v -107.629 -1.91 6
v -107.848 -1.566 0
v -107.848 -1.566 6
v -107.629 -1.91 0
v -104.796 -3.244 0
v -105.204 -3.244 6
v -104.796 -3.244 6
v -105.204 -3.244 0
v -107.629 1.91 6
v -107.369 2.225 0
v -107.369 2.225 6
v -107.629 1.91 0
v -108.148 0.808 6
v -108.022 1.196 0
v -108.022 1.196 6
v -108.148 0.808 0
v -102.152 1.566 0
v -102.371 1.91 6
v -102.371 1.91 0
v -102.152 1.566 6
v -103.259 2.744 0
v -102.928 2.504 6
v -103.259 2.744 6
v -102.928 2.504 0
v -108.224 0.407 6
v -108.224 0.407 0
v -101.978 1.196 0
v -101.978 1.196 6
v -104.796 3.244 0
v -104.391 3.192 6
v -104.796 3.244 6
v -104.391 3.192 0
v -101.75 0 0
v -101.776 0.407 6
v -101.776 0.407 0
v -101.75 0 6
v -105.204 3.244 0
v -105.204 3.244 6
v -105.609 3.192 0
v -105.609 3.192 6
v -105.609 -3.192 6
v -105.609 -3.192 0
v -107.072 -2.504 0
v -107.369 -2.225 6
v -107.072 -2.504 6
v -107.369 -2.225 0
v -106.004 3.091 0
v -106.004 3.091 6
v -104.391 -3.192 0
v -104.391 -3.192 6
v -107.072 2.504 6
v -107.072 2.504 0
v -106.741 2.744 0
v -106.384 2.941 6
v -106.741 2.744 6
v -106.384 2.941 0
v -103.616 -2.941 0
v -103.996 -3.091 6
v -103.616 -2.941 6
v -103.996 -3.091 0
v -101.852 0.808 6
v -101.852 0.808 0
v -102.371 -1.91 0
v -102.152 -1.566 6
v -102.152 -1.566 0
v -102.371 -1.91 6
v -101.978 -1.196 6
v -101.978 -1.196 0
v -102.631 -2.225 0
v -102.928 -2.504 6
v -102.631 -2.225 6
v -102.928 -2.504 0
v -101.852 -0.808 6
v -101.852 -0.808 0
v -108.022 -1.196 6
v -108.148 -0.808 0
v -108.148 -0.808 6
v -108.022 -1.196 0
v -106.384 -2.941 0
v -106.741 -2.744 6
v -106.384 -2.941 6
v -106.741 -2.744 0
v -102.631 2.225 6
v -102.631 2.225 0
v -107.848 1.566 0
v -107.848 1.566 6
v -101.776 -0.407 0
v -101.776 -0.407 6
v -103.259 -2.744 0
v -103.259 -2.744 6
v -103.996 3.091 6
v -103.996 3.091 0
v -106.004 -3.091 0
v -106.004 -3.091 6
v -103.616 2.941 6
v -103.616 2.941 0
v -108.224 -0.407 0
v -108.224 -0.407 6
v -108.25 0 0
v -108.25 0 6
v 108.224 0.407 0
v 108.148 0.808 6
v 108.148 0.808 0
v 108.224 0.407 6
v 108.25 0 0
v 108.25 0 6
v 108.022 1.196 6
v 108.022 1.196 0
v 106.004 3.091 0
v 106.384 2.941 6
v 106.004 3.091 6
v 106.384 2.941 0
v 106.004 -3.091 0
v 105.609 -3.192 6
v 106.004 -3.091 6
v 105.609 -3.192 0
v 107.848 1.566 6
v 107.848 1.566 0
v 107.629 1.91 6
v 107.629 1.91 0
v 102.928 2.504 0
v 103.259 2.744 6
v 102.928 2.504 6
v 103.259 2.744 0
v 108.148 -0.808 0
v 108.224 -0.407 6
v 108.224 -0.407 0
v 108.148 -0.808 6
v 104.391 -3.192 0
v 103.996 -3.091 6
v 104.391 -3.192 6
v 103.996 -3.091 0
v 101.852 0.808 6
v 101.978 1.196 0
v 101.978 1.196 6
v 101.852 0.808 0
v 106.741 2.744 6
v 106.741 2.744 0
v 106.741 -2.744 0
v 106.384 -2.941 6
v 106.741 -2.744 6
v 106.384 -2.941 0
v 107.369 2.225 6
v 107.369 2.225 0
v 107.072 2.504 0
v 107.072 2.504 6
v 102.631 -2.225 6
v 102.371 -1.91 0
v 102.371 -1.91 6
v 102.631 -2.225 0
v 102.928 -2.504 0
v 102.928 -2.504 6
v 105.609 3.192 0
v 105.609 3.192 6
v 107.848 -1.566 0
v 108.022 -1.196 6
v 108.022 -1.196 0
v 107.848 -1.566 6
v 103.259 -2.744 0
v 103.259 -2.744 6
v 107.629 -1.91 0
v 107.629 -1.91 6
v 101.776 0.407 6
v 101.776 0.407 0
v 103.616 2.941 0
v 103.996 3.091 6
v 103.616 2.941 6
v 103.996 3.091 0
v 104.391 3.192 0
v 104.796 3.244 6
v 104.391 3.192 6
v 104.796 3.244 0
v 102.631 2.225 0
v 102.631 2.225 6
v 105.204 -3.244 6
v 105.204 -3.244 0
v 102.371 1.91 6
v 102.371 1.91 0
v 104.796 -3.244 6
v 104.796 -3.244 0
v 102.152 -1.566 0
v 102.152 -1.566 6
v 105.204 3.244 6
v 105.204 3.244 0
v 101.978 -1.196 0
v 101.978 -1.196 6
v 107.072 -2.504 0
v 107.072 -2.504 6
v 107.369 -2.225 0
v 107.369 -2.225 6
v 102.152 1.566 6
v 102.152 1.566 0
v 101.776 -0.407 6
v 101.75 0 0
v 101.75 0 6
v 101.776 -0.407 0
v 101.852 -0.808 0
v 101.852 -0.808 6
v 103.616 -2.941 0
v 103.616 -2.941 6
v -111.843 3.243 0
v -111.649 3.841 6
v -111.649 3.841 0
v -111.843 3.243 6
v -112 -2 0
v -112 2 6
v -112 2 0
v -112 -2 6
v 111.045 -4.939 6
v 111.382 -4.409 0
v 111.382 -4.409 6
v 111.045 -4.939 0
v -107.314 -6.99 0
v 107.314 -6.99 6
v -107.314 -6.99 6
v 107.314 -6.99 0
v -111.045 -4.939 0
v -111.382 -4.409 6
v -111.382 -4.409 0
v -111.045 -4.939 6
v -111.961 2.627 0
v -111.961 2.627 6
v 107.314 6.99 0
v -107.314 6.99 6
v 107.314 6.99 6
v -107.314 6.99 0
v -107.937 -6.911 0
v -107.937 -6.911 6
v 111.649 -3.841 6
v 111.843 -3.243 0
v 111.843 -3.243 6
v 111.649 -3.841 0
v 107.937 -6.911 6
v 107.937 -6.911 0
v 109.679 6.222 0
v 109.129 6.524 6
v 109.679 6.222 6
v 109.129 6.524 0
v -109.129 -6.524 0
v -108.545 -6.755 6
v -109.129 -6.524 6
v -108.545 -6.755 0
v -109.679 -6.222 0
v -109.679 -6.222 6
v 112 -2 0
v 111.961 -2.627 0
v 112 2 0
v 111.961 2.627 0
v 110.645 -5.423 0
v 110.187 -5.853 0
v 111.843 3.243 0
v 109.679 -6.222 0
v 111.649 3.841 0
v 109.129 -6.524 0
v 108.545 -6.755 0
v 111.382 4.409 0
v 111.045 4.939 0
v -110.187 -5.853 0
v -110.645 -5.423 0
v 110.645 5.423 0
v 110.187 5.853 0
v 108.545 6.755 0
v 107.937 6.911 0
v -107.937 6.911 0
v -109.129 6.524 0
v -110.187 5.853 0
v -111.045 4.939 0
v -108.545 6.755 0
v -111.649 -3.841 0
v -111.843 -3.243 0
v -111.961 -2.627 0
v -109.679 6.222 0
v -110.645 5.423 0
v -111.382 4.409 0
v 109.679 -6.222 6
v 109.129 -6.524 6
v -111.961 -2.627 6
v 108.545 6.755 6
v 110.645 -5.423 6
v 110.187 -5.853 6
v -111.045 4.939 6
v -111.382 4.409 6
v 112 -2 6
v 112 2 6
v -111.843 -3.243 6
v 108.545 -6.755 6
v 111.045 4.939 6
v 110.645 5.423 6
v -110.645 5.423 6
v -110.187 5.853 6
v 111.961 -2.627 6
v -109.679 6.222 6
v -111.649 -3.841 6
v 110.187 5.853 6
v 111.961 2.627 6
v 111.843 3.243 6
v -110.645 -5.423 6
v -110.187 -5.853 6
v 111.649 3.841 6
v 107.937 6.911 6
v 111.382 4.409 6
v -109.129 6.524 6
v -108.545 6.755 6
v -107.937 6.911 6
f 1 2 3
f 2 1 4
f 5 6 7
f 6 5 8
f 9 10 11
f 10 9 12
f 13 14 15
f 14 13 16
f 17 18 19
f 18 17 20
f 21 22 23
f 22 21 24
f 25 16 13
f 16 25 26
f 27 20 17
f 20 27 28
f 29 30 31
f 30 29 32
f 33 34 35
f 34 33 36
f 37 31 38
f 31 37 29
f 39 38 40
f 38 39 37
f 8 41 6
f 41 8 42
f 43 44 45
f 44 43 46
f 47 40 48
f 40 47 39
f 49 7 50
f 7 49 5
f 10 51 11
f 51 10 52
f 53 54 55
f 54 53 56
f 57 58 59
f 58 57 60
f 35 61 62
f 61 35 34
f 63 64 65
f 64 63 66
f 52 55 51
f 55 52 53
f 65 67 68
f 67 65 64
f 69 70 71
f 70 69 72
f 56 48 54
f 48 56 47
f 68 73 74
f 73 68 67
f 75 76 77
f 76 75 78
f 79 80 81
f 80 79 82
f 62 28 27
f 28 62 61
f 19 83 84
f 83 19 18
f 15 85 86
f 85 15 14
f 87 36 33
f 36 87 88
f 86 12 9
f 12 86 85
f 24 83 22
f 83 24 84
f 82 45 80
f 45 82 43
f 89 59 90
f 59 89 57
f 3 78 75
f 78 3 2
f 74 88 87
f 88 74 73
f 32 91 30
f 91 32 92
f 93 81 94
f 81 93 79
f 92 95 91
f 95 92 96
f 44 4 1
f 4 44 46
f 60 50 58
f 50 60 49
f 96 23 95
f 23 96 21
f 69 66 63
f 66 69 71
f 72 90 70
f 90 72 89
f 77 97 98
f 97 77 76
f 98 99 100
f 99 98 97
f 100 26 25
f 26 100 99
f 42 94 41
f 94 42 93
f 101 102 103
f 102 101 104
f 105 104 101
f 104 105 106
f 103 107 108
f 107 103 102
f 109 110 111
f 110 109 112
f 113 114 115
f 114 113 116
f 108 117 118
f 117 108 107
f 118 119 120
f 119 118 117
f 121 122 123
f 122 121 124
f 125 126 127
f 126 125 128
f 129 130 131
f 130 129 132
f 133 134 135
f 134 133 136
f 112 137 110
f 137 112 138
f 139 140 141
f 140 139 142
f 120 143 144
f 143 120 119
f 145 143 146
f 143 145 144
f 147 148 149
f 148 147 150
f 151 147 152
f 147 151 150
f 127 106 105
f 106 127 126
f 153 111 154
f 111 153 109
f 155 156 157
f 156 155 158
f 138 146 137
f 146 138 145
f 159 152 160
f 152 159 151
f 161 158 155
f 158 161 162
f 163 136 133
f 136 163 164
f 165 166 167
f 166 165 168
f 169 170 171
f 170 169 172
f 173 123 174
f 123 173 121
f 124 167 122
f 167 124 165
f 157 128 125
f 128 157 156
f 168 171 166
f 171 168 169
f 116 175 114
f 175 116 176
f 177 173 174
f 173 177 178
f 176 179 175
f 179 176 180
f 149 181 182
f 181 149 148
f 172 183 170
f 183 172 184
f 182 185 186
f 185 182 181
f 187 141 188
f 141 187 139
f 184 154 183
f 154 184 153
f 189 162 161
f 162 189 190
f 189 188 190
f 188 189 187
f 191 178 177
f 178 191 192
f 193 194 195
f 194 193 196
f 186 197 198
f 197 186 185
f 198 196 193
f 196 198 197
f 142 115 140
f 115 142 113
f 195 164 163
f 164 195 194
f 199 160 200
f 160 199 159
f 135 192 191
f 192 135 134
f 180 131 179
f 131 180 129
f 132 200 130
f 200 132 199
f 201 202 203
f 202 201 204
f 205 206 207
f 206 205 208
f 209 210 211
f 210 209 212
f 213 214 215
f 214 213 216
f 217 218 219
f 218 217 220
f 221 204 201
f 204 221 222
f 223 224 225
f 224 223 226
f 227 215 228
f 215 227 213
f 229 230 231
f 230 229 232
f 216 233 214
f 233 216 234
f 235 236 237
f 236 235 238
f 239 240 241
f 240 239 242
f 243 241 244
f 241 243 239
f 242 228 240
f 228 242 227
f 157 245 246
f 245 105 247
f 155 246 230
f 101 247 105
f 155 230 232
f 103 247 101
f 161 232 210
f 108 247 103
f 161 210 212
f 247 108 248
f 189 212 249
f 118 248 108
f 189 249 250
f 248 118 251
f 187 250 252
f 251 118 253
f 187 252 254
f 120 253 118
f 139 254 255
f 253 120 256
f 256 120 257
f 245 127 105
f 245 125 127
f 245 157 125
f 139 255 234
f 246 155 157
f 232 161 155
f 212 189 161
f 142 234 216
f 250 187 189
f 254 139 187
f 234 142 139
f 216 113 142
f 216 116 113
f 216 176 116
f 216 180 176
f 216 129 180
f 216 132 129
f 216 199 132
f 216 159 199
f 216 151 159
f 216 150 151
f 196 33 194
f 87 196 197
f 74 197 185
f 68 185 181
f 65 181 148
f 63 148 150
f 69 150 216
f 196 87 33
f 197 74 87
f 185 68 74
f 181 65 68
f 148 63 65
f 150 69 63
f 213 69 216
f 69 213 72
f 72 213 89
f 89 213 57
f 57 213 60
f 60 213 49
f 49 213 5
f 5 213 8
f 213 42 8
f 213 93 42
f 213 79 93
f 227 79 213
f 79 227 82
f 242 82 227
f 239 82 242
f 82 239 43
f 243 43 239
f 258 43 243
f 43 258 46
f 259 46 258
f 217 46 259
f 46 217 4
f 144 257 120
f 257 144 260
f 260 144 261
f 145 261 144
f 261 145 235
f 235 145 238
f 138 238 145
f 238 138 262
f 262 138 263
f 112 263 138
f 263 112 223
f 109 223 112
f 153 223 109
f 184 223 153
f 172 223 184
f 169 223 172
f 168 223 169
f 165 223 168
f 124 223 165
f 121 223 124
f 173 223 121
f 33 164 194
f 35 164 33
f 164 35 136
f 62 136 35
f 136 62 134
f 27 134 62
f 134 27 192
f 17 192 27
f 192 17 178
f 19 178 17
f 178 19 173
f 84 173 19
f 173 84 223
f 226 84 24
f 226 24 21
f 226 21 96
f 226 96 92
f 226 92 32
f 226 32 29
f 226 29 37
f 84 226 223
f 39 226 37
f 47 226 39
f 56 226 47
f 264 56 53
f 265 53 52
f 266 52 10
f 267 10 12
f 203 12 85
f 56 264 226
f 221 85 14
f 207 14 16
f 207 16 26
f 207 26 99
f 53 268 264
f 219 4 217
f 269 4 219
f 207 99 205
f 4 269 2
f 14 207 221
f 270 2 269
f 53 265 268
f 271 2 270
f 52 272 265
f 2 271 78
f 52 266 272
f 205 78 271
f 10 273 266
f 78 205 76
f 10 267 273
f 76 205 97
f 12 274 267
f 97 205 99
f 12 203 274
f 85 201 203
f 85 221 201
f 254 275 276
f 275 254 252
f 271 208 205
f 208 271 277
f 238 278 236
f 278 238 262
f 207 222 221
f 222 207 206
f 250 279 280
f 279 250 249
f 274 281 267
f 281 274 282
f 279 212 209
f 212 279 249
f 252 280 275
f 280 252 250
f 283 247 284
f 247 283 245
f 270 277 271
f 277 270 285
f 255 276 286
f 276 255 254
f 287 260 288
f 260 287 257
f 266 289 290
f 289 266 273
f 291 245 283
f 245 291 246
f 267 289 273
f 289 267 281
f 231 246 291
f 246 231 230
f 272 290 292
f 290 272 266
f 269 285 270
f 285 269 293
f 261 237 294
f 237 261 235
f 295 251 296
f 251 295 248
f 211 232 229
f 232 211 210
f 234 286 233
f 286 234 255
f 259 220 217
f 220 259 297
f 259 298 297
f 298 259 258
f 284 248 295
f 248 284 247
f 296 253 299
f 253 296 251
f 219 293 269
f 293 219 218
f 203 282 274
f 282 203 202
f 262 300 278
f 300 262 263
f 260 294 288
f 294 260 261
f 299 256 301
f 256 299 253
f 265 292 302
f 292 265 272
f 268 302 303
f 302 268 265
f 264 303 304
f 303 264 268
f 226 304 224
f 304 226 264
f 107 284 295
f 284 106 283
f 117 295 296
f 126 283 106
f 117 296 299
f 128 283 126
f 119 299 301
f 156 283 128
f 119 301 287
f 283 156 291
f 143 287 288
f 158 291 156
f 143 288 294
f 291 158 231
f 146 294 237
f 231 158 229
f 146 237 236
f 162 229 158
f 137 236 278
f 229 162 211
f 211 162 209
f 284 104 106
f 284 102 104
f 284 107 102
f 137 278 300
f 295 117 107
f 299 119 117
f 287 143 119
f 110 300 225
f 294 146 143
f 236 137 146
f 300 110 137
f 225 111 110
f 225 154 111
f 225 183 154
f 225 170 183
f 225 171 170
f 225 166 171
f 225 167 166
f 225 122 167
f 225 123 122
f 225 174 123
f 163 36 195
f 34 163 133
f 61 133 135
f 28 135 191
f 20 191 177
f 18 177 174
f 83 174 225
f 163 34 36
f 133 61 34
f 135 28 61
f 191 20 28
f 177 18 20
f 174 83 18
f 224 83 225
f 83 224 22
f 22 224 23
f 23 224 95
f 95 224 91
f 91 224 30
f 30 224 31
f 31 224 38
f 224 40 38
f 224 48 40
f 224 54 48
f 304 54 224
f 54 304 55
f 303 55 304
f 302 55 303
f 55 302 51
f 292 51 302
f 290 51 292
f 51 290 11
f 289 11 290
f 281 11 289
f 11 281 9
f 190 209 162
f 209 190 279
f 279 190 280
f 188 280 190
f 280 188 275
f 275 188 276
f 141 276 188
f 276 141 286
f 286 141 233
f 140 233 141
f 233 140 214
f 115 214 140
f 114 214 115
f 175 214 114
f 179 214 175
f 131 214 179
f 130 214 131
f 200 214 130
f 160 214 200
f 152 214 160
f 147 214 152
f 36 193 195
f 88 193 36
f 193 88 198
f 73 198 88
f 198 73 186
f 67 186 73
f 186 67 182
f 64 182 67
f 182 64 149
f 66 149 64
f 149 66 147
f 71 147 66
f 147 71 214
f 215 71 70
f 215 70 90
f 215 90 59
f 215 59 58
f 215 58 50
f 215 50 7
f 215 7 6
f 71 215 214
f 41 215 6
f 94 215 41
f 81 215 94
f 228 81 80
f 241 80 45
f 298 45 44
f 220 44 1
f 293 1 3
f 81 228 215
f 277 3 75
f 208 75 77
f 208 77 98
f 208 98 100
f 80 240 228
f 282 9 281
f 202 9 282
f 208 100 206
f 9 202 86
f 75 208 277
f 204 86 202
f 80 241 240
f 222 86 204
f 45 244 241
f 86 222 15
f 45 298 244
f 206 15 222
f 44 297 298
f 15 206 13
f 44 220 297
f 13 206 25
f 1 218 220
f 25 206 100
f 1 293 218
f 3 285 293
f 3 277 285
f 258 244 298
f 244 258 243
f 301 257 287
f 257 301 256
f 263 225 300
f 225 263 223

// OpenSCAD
$fn = 50;


difference() {
	union() {
		hull() {
			translate(v = [-107.0000000000, 2.0000000000, 0]) {
				cylinder(h = 6, r = 5);
			}
			translate(v = [107.0000000000, 2.0000000000, 0]) {
				cylinder(h = 6, r = 5);
			}
			translate(v = [-107.0000000000, -2.0000000000, 0]) {
				cylinder(h = 6, r = 5);
			}
			translate(v = [107.0000000000, -2.0000000000, 0]) {
				cylinder(h = 6, r = 5);
			}
		}
	}
	union() {
		translate(v = [-105.0000000000, 0.0000000000, -100.0000000000]) {
			cylinder(h = 200, r = 3.2500000000);
		}
		translate(v = [-105.0000000000, 0.0000000000, -100.0000000000]) {
			cylinder(h = 200, r = 3.2500000000);
		}
		translate(v = [105.0000000000, 0.0000000000, -100.0000000000]) {
			cylinder(h = 200, r = 3.2500000000);
		}
		translate(v = [105.0000000000, 0.0000000000, -100.0000000000]) {
			cylinder(h = 200, r = 3.2500000000);
		}
	}
}
